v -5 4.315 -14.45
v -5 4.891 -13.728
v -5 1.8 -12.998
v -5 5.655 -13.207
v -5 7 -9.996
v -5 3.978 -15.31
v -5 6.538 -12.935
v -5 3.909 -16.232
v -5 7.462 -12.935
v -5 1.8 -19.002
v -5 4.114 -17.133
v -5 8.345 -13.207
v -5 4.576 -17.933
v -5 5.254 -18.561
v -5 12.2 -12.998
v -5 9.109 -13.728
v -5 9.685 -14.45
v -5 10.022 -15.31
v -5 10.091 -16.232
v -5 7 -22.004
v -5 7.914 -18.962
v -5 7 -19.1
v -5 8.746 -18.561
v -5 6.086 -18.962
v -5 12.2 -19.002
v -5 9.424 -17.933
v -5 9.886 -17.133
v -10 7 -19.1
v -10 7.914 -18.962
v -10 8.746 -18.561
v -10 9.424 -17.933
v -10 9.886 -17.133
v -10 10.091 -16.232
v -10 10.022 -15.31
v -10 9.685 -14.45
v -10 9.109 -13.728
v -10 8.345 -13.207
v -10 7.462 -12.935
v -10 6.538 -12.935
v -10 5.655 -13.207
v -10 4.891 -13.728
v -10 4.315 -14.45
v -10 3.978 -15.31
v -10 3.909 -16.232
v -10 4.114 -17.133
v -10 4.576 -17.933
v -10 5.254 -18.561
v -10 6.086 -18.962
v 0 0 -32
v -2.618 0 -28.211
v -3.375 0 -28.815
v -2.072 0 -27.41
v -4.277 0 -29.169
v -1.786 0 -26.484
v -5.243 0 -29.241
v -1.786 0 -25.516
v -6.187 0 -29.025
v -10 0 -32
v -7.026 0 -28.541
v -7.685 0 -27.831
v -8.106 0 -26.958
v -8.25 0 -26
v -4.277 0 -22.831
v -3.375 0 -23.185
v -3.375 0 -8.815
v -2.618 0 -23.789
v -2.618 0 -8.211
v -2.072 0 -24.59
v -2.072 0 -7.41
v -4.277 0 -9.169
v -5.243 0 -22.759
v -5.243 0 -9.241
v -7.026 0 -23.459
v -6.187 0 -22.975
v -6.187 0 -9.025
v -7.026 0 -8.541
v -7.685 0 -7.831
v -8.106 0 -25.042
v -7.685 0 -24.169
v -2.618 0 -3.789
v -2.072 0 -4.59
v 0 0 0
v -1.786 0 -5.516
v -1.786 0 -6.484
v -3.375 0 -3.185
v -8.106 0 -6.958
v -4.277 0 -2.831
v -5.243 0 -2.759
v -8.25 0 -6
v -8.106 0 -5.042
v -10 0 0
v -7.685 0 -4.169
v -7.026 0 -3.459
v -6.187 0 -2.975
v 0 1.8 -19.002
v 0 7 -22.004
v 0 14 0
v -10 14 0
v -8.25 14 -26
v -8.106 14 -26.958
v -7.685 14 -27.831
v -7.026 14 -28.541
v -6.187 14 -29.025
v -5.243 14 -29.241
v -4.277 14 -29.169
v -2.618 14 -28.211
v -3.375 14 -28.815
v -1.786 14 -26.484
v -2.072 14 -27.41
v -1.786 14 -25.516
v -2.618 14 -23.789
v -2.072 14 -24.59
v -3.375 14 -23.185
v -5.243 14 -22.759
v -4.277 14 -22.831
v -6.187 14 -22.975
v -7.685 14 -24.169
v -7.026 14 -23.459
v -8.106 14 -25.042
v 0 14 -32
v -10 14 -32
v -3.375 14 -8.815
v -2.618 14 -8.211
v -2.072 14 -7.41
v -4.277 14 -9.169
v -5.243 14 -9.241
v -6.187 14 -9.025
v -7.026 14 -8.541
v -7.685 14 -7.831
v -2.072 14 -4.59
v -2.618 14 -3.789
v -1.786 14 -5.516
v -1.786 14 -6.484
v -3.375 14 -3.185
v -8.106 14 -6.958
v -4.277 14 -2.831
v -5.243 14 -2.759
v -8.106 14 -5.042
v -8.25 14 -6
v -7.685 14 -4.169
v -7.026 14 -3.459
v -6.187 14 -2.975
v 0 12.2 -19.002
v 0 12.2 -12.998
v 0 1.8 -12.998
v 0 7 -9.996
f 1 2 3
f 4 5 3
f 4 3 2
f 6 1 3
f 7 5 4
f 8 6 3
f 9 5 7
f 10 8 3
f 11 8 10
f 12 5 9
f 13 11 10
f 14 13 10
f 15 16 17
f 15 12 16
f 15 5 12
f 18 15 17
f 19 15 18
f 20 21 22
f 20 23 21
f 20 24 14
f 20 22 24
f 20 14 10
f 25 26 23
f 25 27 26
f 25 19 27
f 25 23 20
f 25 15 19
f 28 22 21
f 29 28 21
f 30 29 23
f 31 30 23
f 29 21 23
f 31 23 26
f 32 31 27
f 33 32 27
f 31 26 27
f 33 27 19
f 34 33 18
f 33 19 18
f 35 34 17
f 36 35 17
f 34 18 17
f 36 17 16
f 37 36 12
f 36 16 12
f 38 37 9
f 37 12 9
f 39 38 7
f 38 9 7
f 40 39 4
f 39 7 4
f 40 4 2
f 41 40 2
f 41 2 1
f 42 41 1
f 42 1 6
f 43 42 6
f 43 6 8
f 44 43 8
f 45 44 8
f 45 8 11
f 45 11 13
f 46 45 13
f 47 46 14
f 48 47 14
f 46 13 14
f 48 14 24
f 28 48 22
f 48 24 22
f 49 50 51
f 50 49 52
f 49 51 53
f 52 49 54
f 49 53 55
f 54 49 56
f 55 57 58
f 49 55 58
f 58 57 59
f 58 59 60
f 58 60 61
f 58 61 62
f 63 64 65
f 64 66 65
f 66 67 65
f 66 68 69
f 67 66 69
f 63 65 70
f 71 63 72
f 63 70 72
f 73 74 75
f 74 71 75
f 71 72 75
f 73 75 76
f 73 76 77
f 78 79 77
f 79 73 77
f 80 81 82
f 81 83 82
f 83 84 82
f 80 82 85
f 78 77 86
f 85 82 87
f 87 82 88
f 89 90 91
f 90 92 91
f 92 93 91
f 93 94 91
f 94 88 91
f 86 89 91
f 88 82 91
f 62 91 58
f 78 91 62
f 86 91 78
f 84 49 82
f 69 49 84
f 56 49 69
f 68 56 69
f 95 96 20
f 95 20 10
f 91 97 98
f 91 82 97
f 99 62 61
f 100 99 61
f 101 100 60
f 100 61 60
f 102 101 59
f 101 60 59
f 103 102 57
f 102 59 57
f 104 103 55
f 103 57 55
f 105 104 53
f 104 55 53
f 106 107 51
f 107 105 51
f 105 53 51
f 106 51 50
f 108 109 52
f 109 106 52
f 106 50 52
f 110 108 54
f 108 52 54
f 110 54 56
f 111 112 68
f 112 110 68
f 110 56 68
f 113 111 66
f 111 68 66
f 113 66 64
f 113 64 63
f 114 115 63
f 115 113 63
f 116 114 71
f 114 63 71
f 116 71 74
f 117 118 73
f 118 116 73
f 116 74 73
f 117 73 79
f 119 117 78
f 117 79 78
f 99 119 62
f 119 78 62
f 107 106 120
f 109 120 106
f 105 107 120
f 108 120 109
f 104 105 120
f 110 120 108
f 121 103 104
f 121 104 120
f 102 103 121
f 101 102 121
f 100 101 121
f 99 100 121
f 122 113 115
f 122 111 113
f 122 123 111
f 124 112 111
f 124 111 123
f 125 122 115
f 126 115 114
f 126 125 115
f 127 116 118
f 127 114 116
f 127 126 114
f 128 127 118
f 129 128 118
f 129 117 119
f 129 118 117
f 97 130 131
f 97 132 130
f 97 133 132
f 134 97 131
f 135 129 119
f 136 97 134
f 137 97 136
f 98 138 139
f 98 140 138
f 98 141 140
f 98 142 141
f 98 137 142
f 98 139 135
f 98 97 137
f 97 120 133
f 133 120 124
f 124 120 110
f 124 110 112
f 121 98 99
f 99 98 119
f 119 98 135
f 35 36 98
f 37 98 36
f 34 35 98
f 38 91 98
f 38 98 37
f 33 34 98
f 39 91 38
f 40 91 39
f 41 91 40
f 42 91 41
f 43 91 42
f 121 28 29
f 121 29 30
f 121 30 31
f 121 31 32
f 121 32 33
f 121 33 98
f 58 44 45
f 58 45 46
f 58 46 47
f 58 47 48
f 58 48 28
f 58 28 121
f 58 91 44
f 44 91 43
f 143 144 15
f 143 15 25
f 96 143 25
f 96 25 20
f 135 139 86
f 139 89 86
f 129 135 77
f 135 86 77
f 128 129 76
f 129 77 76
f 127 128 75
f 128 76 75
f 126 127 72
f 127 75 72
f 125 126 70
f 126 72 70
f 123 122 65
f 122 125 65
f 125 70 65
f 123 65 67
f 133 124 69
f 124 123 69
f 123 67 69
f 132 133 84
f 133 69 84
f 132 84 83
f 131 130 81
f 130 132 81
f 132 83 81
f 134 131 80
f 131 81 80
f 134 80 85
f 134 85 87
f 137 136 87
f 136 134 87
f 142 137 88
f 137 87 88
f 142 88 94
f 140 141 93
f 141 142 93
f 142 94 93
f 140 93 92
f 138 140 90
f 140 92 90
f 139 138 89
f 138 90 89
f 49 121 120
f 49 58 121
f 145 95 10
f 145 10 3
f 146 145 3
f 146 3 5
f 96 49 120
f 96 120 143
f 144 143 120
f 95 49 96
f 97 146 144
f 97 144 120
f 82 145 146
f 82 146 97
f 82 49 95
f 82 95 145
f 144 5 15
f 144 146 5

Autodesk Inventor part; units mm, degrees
ref_plane "YZ Plane" through (0, 0, 0) normal (1, 0, 0) x (0, 1, 0)
ref_plane "XZ Plane" through (0, 0, 0) normal (0, 1, 0) x (-1, 0, 0)
ref_plane "XY Plane" through (0, 0, 0) normal (0, 0, 1) x (1, 0, 0)
sketch "Sketch1" plane through (0, 0, 0) normal (0, 1, 0) x (-1, 0, 0)
  line L0 (0, 0) -> (10, 0)
  line L1 (10, 0) -> (10, -32)
  line L2 (10, -32) -> (0, -32)
  line L3 (0, -32) -> (0, 0)
  circle A0 centre (5, -6) radius 3.25
  circle A1 centre (5, -26) radius 3.25
  dimension "t" = 10
  dimension "d2" = 6.5
  dimension "d3" = 6.5
  dimension "d4" = 6
  dimension "d5" = 6
  dimension "d6" = 5
  dimension "d7" = 5
  dimension "height" = 32
extrude "Extrusion1" add sketch "Sketch1" along normal blind 14
sketch "Sketch2" plane through (0, 0, 0) normal (1, 0, 0) x (0, 0, -1)
  circle A0 centre (16, 7) radius 3.1
  line L0 (0, 0) -> (0, 14) projected
  line L1 (32, 0) -> (0, 0) projected
  dimension "d10" = 6.2
  dimension "d12" = 16
  dimension "d13" = 7
extrude "Extrusion2" cut sketch "Sketch2" against normal up to next
sketch "Sketch3" plane through (0, 0, 0) normal (1, 0, 0) x (0, 0, -1)
  circle A0 centre (16, 7) radius 3.1 projected
  line L0 (22.0044, 7) -> (19.0022, 1.8)
  line L1 (19.0022, 1.8) -> (12.9978, 1.8)
  line L2 (12.9978, 1.8) -> (9.9956, 7)
  line L3 (9.9956, 7) -> (12.9978, 12.2)
  line L4 (12.9978, 12.2) -> (19.0022, 12.2)
  line L5 (19.0022, 12.2) -> (22.0044, 7)
  line L6 (0, 14) -> (32, 14) projected
  point P0 (0, 0)
  point P1 (16, 12.2)
  dimension "d16" = 10.4
extrude "Extrusion3" cut sketch "Sketch3" against normal blind 5
equation "\"d6\" = 0.5 * t"
equation "\"d7\" = 0.5 * t"
equation "\"d12\" = 0.5 * height"
properties part number "smallSprocketFixture" material "ABS Plastic"
